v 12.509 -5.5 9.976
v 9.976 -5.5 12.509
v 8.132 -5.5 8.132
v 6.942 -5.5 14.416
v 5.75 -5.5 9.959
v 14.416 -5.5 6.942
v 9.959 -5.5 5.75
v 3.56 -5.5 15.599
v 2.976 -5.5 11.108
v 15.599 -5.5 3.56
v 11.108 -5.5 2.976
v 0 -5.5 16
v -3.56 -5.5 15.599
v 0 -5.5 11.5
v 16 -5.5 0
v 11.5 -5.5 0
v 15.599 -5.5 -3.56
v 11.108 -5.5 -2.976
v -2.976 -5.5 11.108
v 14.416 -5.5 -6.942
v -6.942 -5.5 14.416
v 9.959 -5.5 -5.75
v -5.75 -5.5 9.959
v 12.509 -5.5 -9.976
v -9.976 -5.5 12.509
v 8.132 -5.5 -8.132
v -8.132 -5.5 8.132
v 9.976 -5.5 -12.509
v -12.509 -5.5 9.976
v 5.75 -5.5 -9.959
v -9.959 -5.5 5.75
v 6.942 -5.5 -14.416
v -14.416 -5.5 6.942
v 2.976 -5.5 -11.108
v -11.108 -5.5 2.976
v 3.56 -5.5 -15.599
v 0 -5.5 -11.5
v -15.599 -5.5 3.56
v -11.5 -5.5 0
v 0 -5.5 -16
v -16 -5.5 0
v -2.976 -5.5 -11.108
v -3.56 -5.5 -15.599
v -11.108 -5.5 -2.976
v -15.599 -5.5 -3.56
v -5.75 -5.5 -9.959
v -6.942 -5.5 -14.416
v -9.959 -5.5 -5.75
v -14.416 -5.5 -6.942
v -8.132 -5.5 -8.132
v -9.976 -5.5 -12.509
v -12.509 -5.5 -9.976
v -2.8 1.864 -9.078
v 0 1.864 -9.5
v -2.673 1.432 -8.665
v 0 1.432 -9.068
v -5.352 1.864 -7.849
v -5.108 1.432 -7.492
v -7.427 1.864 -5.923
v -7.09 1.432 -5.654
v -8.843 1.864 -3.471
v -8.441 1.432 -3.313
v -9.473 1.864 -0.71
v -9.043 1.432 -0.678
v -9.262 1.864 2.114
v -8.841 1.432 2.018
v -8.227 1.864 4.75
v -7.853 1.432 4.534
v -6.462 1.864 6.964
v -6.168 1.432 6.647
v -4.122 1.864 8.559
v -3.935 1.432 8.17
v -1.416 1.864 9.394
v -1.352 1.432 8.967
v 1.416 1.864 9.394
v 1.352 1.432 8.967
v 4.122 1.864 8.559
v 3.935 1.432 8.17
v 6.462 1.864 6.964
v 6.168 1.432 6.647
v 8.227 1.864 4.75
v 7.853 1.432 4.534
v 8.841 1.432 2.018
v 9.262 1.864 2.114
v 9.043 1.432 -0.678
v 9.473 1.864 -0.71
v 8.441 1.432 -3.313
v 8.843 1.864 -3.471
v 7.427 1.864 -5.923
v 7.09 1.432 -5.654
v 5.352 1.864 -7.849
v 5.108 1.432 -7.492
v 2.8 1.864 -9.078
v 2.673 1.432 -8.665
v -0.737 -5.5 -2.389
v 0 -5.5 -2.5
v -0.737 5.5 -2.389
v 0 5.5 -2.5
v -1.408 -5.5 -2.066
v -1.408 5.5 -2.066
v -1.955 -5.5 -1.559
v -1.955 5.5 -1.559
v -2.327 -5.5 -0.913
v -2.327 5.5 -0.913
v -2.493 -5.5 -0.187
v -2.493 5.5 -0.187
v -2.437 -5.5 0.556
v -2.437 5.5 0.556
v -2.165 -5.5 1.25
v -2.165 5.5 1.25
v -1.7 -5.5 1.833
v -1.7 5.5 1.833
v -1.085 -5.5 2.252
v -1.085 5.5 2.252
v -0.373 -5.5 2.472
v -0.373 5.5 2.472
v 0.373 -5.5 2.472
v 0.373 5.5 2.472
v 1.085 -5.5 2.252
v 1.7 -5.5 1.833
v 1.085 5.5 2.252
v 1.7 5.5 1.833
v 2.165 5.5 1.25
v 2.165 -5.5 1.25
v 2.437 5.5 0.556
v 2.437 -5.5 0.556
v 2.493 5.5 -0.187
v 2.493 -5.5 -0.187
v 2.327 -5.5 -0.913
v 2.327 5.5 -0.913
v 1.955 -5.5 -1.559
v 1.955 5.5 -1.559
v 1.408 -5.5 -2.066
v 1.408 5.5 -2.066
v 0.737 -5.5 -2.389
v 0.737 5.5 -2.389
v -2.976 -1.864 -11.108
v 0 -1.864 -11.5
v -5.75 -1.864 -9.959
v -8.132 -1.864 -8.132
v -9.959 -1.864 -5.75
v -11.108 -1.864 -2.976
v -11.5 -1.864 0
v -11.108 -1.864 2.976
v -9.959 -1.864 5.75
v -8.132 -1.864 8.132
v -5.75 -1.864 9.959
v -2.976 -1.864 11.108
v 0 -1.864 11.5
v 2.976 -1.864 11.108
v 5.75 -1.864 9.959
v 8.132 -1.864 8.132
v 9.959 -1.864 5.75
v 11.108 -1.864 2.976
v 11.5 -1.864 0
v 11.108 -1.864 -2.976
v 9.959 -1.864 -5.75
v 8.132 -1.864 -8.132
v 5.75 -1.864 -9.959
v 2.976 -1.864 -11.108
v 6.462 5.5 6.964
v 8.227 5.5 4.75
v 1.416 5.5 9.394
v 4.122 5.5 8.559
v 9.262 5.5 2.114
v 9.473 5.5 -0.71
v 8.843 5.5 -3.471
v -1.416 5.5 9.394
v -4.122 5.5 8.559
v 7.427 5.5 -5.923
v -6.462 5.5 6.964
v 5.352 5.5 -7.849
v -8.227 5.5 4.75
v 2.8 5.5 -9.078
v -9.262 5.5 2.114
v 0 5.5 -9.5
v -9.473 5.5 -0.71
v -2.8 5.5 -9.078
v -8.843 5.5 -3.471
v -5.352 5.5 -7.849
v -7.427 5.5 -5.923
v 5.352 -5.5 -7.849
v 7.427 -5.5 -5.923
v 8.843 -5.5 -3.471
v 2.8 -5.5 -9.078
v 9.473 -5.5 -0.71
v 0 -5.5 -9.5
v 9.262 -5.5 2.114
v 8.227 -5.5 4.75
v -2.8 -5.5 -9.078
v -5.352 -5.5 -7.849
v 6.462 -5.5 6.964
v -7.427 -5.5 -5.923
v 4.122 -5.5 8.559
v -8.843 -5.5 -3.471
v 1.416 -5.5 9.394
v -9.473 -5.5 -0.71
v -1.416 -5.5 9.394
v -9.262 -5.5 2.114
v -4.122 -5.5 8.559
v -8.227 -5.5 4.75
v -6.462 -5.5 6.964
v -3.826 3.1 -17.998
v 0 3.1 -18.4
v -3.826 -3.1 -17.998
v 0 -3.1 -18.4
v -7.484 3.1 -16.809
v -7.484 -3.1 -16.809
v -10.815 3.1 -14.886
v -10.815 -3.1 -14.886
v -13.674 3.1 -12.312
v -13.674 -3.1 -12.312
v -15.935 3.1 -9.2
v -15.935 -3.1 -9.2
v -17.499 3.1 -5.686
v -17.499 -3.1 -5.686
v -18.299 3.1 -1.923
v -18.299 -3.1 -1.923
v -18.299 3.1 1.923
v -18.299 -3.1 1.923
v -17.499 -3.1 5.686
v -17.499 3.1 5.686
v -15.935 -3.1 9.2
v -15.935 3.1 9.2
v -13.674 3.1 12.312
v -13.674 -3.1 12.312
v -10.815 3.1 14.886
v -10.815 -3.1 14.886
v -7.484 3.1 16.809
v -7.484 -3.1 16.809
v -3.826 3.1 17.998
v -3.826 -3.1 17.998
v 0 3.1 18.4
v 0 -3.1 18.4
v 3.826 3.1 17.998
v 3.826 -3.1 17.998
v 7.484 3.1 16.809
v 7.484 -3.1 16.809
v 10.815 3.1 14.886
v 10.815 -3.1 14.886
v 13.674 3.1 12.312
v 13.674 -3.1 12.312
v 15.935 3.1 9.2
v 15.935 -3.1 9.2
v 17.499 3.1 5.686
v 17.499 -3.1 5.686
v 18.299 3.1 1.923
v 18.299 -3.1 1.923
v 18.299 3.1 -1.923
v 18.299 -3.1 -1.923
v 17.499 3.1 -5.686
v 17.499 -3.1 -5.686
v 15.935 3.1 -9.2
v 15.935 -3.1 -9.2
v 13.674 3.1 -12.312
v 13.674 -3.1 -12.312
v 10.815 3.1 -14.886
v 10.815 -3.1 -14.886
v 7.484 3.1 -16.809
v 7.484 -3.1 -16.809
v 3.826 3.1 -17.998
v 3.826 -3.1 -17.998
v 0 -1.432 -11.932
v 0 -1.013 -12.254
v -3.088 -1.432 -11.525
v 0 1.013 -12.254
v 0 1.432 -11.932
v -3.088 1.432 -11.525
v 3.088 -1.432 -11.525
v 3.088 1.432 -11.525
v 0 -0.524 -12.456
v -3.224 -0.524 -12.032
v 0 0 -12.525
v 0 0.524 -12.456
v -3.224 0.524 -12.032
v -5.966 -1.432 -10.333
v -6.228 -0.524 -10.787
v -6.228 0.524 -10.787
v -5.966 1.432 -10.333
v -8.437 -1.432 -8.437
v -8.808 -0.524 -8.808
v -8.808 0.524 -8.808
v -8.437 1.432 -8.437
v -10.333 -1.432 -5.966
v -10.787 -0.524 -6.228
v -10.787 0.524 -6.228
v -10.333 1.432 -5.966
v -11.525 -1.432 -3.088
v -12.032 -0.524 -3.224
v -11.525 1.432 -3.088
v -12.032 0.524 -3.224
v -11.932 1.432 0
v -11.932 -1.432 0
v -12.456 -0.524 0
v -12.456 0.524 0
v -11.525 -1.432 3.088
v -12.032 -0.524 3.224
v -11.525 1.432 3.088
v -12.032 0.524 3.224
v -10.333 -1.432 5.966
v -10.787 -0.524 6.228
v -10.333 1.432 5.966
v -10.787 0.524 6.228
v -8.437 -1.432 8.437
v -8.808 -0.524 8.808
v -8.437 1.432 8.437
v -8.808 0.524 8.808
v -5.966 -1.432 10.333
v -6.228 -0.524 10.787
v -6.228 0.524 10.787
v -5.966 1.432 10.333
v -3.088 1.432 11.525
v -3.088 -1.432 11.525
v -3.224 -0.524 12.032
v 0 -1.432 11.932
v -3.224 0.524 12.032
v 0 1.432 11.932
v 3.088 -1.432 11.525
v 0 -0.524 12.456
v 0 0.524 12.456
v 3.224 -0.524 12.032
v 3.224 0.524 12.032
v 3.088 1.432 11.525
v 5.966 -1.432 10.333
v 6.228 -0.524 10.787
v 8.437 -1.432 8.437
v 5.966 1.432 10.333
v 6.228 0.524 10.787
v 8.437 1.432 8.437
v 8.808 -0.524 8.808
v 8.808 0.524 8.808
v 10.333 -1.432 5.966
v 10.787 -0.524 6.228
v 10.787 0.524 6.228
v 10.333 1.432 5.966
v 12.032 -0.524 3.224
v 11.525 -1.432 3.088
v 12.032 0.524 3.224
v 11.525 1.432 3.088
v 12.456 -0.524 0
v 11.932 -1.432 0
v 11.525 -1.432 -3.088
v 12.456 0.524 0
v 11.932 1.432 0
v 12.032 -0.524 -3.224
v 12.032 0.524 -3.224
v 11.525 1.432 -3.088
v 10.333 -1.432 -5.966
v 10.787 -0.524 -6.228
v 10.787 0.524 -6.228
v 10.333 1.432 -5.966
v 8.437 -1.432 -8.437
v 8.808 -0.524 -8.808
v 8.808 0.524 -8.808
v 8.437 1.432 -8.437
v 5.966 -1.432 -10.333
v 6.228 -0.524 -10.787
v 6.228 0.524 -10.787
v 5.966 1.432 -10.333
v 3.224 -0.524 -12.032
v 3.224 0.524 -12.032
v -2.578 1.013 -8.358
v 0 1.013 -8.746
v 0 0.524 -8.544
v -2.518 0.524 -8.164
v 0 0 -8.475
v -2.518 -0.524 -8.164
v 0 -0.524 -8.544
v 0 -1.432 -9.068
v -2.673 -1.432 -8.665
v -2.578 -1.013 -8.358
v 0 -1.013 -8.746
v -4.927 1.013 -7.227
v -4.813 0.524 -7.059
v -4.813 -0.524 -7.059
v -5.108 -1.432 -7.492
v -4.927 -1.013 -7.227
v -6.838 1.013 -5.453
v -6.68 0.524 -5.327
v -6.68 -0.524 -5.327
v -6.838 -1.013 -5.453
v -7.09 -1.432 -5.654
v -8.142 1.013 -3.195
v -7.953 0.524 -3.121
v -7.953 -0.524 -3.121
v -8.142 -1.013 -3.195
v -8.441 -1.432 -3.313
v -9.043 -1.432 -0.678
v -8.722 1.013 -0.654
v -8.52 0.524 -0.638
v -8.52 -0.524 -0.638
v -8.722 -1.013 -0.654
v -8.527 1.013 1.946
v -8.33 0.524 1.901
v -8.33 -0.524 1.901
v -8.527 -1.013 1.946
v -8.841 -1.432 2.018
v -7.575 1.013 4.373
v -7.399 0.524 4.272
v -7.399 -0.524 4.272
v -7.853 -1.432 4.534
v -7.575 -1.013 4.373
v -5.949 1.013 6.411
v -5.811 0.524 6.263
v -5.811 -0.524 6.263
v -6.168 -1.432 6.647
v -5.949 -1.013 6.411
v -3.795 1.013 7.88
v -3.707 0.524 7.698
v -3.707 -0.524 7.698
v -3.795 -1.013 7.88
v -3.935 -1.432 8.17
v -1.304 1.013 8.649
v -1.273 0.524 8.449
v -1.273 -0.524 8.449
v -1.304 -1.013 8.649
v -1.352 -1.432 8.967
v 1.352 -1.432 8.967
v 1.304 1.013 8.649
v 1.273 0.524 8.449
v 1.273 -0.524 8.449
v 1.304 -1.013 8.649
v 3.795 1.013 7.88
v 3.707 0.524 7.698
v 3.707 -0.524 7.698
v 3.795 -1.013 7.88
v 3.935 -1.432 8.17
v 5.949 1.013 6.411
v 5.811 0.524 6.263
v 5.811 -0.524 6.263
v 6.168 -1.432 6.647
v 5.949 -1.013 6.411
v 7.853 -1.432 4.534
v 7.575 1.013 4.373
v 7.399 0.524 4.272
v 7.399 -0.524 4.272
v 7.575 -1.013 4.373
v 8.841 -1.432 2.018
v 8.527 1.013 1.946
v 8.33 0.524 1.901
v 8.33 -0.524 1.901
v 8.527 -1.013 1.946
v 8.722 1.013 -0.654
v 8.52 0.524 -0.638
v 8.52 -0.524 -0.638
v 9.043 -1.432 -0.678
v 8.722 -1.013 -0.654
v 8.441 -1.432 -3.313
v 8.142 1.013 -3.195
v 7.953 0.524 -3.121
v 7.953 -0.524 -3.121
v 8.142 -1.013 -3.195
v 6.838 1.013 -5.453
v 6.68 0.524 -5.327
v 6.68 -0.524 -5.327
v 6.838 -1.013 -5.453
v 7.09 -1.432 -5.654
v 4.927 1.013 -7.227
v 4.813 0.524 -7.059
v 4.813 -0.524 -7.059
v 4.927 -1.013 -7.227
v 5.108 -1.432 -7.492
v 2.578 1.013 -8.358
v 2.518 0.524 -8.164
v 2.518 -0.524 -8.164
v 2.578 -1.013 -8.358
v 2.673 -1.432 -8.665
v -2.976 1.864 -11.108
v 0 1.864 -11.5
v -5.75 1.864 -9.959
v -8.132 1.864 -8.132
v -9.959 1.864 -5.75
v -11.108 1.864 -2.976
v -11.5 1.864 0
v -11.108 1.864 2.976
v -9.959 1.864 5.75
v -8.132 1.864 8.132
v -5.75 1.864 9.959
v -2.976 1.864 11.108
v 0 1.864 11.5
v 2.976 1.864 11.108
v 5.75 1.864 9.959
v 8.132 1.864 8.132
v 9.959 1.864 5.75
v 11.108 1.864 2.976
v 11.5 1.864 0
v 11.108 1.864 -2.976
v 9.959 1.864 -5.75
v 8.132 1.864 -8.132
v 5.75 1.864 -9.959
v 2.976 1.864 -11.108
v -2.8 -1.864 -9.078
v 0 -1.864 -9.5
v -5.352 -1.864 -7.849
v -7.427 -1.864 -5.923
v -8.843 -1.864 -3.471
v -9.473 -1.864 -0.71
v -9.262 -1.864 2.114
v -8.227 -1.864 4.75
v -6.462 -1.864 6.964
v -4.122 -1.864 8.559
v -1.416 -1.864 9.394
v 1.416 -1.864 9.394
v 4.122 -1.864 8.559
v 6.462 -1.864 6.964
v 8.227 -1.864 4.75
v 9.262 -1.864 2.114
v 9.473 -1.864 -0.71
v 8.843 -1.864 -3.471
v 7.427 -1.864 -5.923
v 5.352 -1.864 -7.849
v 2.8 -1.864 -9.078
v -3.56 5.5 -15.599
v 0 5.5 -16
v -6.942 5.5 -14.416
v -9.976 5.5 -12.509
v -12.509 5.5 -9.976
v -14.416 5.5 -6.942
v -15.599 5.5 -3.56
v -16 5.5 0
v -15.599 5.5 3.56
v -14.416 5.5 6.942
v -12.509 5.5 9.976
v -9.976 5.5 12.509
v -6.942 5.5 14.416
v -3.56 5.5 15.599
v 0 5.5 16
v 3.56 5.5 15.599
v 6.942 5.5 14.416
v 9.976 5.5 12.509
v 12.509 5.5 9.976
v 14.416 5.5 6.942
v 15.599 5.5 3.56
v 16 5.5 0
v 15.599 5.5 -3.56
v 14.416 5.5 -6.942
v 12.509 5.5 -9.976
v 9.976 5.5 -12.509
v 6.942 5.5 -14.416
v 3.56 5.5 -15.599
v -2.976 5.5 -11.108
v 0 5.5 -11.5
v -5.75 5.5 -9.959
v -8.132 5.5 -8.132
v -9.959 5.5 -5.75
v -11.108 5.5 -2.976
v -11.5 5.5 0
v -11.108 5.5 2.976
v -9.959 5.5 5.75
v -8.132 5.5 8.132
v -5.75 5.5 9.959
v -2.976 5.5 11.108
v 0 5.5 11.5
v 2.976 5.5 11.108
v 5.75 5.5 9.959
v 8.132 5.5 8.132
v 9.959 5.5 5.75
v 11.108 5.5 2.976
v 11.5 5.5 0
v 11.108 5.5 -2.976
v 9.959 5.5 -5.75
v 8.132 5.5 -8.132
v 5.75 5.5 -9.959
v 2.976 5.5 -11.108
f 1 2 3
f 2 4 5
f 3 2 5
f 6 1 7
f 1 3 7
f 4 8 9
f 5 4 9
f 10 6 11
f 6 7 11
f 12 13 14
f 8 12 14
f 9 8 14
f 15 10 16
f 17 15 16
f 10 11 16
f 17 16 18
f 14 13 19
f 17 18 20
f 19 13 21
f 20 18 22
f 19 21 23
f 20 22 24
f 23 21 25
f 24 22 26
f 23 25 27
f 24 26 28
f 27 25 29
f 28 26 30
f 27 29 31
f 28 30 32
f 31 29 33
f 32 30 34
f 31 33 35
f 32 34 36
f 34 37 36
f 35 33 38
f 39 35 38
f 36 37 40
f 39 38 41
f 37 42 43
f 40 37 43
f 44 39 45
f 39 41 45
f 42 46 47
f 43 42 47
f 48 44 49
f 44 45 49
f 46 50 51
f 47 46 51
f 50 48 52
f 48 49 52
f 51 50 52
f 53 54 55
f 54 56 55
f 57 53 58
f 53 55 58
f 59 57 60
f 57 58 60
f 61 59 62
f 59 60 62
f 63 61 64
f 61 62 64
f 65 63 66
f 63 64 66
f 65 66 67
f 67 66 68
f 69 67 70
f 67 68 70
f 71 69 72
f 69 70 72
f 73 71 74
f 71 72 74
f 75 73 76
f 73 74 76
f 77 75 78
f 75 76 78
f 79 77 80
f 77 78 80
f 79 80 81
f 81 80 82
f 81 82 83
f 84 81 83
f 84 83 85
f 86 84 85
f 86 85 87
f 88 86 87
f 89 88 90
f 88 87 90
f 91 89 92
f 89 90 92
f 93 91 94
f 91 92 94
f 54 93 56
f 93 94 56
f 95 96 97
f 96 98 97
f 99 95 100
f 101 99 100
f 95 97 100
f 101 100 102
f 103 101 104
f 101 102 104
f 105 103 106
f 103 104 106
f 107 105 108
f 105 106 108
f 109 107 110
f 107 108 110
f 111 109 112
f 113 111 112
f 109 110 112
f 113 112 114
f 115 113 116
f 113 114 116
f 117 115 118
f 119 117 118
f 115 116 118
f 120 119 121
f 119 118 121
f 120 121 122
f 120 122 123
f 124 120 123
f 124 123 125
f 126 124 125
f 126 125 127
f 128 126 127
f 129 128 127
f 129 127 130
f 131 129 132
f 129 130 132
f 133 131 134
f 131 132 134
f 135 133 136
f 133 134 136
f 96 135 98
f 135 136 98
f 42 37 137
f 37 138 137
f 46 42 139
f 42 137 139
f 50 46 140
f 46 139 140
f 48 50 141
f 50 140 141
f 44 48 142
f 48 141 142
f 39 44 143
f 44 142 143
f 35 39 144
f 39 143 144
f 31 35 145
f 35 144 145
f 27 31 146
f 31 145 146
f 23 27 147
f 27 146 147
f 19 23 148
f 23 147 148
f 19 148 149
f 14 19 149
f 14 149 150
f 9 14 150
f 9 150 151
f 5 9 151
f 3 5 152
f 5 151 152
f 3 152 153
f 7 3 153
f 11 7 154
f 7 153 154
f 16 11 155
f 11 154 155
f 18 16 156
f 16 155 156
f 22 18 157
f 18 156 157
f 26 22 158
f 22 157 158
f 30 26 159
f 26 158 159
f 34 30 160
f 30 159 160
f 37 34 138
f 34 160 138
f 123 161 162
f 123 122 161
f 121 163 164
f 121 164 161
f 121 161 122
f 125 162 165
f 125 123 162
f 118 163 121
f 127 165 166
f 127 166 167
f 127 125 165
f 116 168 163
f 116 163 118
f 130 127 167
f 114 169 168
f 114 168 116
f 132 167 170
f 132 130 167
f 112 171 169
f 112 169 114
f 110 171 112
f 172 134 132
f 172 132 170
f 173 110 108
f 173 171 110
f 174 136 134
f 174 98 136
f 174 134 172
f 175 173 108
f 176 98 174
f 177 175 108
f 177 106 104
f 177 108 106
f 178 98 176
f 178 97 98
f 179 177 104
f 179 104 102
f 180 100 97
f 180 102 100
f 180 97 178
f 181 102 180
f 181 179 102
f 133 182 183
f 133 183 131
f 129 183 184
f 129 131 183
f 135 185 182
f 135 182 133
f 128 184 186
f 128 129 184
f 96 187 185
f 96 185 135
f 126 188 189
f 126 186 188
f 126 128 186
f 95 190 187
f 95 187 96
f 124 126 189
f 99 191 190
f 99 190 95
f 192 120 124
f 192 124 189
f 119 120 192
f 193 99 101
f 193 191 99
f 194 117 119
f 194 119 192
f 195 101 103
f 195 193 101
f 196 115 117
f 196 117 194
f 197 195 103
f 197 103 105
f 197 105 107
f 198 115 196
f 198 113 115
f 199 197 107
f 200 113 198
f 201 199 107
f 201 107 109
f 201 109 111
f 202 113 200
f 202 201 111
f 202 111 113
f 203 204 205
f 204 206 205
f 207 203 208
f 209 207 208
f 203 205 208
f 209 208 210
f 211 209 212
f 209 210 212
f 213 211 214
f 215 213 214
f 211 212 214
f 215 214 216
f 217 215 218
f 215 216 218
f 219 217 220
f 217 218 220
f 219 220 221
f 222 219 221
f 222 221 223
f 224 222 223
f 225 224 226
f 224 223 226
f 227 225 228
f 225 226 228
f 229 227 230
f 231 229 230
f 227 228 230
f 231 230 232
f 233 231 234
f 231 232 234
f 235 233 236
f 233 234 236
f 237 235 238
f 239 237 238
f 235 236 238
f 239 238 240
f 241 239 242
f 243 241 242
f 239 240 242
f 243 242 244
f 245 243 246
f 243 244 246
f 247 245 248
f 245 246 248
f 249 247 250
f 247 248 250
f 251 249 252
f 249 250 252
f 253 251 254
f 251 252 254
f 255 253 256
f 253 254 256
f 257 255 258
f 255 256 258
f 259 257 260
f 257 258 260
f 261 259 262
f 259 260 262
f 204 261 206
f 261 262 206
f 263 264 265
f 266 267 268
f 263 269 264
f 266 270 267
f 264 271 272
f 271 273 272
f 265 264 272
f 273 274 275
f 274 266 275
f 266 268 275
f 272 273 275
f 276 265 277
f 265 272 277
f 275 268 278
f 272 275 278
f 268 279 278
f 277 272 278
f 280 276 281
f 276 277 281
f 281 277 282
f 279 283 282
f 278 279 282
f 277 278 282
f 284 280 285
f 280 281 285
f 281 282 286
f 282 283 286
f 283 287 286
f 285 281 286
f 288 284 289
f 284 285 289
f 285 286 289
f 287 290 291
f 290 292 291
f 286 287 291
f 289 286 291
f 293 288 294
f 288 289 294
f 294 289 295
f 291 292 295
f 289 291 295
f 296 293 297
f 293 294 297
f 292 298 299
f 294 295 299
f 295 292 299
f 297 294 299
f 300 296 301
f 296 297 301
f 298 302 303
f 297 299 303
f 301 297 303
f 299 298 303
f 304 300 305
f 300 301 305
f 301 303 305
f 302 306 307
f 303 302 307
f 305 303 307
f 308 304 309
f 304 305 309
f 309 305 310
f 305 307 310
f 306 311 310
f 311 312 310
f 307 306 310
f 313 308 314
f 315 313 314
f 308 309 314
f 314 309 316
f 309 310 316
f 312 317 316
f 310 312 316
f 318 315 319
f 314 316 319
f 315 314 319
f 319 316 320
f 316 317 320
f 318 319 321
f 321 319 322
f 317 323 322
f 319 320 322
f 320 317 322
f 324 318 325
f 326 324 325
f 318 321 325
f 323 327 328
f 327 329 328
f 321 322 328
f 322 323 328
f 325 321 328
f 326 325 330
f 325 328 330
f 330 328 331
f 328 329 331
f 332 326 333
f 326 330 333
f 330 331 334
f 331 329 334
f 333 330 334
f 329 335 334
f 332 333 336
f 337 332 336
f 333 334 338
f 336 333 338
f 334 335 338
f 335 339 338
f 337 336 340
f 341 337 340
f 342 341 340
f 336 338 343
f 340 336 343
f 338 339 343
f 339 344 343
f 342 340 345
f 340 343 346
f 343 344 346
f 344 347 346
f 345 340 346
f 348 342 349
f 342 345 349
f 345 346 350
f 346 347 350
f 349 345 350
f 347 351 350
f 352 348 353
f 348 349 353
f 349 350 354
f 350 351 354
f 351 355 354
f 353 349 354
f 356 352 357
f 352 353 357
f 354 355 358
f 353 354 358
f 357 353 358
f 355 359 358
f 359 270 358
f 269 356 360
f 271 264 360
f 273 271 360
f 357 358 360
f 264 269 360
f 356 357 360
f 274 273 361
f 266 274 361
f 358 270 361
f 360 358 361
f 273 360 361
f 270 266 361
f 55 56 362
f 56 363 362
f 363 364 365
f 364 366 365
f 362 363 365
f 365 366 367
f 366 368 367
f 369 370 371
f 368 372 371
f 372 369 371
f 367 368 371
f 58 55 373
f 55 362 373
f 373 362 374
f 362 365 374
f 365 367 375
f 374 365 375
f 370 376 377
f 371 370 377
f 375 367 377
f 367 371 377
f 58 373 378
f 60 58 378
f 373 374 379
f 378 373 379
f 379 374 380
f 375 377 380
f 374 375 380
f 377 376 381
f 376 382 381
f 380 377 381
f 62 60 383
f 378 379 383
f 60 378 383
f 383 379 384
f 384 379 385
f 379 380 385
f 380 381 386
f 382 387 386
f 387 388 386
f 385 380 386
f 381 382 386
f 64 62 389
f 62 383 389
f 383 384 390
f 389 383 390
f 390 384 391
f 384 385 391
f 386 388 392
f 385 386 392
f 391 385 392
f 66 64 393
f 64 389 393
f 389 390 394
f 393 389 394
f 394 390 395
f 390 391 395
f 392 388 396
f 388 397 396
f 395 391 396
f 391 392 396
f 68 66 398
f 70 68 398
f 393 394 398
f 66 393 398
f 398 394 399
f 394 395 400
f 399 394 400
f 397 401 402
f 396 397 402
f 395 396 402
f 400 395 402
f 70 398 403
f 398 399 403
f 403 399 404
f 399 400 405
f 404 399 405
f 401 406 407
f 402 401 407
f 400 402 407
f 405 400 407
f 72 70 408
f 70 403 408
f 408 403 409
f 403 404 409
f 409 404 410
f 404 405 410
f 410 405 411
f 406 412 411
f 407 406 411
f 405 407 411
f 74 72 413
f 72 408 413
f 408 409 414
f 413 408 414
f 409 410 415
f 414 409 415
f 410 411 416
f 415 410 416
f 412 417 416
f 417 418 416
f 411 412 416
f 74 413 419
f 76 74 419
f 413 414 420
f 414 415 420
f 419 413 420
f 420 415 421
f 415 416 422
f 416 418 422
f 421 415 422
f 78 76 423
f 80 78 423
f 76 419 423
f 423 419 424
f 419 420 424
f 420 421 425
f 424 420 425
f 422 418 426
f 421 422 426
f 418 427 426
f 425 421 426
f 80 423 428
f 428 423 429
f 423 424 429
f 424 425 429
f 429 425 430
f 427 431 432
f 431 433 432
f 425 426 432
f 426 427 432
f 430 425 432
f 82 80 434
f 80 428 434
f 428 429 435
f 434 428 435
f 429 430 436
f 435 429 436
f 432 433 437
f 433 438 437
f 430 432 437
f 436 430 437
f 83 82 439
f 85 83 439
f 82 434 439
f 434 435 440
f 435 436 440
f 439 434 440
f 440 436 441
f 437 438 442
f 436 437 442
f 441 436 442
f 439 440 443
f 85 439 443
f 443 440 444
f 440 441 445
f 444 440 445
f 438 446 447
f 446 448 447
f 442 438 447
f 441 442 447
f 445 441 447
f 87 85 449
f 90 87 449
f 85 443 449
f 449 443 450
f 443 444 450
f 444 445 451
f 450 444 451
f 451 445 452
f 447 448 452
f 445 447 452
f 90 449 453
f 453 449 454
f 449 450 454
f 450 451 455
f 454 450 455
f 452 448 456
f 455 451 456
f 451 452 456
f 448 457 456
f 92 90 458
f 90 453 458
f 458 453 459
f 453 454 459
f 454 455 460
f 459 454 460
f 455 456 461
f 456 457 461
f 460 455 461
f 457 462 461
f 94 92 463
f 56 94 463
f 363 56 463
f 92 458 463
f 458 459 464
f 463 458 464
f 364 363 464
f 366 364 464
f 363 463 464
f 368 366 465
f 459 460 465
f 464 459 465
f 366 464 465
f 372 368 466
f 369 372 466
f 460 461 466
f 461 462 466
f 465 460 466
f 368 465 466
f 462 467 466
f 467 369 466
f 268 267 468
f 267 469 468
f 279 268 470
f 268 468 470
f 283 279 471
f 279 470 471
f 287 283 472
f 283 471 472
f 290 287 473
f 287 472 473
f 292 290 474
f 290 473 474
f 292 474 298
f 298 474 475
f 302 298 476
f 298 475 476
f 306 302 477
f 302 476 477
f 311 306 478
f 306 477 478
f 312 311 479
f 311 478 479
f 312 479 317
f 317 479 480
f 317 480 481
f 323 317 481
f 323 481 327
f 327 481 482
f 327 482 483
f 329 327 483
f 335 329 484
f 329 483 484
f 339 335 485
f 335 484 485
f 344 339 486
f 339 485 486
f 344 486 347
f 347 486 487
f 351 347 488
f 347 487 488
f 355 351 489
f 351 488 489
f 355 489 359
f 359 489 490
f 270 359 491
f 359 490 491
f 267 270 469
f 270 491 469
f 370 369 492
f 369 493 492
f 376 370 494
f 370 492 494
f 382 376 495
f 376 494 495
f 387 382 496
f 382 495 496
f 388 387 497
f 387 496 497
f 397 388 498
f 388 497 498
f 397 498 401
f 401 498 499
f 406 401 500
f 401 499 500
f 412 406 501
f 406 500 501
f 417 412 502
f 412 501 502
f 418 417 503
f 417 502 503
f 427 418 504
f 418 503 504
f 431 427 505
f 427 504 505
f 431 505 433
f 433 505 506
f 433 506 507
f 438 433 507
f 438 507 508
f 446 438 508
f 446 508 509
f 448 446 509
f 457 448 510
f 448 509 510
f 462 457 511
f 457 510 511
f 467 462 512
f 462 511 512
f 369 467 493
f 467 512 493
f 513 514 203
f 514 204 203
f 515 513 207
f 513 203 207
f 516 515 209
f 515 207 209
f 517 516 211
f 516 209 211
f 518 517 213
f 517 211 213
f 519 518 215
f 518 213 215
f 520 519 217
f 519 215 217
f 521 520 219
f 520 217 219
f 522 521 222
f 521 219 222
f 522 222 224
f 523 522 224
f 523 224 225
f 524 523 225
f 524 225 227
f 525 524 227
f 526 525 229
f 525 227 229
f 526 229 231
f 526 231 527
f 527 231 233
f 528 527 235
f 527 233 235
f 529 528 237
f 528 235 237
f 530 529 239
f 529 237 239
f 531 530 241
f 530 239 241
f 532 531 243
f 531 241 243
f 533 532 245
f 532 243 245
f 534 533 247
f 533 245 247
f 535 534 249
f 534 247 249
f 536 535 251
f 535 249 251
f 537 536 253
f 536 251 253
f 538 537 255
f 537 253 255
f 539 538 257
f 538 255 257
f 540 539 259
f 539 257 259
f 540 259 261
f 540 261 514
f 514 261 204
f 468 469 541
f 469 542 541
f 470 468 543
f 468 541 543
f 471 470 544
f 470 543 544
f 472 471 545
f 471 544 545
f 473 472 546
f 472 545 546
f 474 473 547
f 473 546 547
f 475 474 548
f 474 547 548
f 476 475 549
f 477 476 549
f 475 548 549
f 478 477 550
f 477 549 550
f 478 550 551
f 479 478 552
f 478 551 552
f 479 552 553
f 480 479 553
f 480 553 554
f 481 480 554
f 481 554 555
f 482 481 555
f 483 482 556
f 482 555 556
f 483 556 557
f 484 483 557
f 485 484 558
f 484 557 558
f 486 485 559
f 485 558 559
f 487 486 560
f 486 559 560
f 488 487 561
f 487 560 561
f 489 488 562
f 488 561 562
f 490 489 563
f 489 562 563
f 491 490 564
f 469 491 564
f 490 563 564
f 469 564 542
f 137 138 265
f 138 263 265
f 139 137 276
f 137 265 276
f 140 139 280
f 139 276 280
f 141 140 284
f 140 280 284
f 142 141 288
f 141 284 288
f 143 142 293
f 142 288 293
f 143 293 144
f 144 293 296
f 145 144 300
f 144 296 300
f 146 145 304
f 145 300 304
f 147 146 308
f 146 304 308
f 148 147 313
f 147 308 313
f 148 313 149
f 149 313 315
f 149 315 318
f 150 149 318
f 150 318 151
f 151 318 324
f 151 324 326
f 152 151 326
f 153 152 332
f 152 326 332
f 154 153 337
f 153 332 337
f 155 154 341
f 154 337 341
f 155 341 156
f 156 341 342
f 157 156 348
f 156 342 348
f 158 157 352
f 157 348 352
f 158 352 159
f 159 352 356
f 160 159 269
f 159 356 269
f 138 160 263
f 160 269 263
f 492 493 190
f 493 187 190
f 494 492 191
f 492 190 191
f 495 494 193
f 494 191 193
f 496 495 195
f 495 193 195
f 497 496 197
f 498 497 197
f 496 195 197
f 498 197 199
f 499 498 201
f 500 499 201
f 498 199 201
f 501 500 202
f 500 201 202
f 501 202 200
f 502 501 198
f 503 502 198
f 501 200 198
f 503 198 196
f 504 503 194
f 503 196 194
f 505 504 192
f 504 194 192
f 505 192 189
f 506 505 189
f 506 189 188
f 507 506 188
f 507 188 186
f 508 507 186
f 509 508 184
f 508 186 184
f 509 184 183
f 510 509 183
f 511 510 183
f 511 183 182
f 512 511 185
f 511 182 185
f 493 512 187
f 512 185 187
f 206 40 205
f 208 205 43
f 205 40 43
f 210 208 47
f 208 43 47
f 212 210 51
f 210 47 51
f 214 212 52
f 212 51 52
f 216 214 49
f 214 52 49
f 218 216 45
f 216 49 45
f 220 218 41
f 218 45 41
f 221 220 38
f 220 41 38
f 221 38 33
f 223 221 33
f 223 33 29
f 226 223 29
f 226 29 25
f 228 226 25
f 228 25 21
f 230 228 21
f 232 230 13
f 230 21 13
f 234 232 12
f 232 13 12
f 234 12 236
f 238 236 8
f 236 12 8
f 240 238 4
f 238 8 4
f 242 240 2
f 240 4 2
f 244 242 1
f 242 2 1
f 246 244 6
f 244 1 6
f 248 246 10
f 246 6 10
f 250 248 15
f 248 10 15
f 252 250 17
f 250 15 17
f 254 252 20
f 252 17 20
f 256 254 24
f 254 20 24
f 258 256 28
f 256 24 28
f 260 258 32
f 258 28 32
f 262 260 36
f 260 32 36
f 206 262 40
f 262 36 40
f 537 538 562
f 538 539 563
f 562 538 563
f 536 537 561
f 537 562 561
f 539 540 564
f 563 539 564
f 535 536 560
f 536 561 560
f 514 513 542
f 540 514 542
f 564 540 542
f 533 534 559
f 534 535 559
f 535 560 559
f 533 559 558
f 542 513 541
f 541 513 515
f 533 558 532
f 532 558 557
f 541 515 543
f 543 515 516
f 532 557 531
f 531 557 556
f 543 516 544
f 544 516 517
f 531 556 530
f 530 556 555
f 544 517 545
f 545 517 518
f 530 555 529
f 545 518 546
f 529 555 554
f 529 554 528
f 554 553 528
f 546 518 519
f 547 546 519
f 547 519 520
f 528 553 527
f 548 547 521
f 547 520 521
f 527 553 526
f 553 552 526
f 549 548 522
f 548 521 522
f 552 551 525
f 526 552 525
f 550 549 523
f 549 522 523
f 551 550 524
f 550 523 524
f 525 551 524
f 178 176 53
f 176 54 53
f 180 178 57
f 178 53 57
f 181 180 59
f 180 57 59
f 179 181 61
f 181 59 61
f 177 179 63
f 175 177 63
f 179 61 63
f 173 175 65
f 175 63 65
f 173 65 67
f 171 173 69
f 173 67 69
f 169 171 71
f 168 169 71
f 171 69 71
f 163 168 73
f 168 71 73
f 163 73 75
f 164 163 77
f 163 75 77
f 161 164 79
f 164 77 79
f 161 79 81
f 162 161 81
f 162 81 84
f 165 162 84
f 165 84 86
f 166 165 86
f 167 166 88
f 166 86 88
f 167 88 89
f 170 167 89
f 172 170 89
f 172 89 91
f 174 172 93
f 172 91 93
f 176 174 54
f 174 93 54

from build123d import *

# Parameters (mm, degrees)
SKETCH2_W = 2.5
SKETCH2_H = 11


with BuildPart() as part:
    # Sketch2 → Revolve2 (revolve)
    with BuildSketch(Plane.XY, mode=Mode.PRIVATE) as revolve2_sk:
        with Locations((3.75, 0)):
            Rectangle(SKETCH2_W, SKETCH2_H)
        with BuildLine():
            Line((9.068108768, -1.431891232), (9.5, -1.863782464))
            Line((9.5, -1.863782464), (9.5, -5.5))
            Line((9.5, -5.5), (5, -5.5))
            Line((5, -5.5), (5, 5.5))
            Line((5, 5.5), (9.5, 5.5))
            Line((9.5, 5.5), (9.5, 1.863782464))
            Line((9.5, 1.863782464), (9.068108768, 1.431891232))
            ThreePointArc((9.068108768, 1.431891232), (8.475, 0), (9.068108768, -1.431891232))
        make_face()
        with BuildLine():
            ThreePointArc((11.931891232, -1.431891232), (12.525, 0), (11.931891232, 1.431891232))
            Line((11.931891232, 1.431891232), (11.5, 1.863782464))
            Line((11.5, 1.863782464), (11.5, 5.5))
            Line((11.5, 5.5), (16, 5.5))
            Line((16, 5.5), (16, -5.5))
            Line((16, -5.5), (11.5, -5.5))
            Line((11.5, -5.5), (11.5, -1.863782464))
            Line((11.5, -1.863782464), (11.931891232, -1.431891232))
        make_face()
        Polygon((18.4, -3.1), (16, -5.5), (16, 5.5), (18.4, 3.1), align=None)
    revolve(revolve2_sk.sketch.rotate(Axis((0, 0, 0), (0, 1, 0)), 90), axis=Axis((0, 0, 0), (0, 1, 0)))


solid = part.part
